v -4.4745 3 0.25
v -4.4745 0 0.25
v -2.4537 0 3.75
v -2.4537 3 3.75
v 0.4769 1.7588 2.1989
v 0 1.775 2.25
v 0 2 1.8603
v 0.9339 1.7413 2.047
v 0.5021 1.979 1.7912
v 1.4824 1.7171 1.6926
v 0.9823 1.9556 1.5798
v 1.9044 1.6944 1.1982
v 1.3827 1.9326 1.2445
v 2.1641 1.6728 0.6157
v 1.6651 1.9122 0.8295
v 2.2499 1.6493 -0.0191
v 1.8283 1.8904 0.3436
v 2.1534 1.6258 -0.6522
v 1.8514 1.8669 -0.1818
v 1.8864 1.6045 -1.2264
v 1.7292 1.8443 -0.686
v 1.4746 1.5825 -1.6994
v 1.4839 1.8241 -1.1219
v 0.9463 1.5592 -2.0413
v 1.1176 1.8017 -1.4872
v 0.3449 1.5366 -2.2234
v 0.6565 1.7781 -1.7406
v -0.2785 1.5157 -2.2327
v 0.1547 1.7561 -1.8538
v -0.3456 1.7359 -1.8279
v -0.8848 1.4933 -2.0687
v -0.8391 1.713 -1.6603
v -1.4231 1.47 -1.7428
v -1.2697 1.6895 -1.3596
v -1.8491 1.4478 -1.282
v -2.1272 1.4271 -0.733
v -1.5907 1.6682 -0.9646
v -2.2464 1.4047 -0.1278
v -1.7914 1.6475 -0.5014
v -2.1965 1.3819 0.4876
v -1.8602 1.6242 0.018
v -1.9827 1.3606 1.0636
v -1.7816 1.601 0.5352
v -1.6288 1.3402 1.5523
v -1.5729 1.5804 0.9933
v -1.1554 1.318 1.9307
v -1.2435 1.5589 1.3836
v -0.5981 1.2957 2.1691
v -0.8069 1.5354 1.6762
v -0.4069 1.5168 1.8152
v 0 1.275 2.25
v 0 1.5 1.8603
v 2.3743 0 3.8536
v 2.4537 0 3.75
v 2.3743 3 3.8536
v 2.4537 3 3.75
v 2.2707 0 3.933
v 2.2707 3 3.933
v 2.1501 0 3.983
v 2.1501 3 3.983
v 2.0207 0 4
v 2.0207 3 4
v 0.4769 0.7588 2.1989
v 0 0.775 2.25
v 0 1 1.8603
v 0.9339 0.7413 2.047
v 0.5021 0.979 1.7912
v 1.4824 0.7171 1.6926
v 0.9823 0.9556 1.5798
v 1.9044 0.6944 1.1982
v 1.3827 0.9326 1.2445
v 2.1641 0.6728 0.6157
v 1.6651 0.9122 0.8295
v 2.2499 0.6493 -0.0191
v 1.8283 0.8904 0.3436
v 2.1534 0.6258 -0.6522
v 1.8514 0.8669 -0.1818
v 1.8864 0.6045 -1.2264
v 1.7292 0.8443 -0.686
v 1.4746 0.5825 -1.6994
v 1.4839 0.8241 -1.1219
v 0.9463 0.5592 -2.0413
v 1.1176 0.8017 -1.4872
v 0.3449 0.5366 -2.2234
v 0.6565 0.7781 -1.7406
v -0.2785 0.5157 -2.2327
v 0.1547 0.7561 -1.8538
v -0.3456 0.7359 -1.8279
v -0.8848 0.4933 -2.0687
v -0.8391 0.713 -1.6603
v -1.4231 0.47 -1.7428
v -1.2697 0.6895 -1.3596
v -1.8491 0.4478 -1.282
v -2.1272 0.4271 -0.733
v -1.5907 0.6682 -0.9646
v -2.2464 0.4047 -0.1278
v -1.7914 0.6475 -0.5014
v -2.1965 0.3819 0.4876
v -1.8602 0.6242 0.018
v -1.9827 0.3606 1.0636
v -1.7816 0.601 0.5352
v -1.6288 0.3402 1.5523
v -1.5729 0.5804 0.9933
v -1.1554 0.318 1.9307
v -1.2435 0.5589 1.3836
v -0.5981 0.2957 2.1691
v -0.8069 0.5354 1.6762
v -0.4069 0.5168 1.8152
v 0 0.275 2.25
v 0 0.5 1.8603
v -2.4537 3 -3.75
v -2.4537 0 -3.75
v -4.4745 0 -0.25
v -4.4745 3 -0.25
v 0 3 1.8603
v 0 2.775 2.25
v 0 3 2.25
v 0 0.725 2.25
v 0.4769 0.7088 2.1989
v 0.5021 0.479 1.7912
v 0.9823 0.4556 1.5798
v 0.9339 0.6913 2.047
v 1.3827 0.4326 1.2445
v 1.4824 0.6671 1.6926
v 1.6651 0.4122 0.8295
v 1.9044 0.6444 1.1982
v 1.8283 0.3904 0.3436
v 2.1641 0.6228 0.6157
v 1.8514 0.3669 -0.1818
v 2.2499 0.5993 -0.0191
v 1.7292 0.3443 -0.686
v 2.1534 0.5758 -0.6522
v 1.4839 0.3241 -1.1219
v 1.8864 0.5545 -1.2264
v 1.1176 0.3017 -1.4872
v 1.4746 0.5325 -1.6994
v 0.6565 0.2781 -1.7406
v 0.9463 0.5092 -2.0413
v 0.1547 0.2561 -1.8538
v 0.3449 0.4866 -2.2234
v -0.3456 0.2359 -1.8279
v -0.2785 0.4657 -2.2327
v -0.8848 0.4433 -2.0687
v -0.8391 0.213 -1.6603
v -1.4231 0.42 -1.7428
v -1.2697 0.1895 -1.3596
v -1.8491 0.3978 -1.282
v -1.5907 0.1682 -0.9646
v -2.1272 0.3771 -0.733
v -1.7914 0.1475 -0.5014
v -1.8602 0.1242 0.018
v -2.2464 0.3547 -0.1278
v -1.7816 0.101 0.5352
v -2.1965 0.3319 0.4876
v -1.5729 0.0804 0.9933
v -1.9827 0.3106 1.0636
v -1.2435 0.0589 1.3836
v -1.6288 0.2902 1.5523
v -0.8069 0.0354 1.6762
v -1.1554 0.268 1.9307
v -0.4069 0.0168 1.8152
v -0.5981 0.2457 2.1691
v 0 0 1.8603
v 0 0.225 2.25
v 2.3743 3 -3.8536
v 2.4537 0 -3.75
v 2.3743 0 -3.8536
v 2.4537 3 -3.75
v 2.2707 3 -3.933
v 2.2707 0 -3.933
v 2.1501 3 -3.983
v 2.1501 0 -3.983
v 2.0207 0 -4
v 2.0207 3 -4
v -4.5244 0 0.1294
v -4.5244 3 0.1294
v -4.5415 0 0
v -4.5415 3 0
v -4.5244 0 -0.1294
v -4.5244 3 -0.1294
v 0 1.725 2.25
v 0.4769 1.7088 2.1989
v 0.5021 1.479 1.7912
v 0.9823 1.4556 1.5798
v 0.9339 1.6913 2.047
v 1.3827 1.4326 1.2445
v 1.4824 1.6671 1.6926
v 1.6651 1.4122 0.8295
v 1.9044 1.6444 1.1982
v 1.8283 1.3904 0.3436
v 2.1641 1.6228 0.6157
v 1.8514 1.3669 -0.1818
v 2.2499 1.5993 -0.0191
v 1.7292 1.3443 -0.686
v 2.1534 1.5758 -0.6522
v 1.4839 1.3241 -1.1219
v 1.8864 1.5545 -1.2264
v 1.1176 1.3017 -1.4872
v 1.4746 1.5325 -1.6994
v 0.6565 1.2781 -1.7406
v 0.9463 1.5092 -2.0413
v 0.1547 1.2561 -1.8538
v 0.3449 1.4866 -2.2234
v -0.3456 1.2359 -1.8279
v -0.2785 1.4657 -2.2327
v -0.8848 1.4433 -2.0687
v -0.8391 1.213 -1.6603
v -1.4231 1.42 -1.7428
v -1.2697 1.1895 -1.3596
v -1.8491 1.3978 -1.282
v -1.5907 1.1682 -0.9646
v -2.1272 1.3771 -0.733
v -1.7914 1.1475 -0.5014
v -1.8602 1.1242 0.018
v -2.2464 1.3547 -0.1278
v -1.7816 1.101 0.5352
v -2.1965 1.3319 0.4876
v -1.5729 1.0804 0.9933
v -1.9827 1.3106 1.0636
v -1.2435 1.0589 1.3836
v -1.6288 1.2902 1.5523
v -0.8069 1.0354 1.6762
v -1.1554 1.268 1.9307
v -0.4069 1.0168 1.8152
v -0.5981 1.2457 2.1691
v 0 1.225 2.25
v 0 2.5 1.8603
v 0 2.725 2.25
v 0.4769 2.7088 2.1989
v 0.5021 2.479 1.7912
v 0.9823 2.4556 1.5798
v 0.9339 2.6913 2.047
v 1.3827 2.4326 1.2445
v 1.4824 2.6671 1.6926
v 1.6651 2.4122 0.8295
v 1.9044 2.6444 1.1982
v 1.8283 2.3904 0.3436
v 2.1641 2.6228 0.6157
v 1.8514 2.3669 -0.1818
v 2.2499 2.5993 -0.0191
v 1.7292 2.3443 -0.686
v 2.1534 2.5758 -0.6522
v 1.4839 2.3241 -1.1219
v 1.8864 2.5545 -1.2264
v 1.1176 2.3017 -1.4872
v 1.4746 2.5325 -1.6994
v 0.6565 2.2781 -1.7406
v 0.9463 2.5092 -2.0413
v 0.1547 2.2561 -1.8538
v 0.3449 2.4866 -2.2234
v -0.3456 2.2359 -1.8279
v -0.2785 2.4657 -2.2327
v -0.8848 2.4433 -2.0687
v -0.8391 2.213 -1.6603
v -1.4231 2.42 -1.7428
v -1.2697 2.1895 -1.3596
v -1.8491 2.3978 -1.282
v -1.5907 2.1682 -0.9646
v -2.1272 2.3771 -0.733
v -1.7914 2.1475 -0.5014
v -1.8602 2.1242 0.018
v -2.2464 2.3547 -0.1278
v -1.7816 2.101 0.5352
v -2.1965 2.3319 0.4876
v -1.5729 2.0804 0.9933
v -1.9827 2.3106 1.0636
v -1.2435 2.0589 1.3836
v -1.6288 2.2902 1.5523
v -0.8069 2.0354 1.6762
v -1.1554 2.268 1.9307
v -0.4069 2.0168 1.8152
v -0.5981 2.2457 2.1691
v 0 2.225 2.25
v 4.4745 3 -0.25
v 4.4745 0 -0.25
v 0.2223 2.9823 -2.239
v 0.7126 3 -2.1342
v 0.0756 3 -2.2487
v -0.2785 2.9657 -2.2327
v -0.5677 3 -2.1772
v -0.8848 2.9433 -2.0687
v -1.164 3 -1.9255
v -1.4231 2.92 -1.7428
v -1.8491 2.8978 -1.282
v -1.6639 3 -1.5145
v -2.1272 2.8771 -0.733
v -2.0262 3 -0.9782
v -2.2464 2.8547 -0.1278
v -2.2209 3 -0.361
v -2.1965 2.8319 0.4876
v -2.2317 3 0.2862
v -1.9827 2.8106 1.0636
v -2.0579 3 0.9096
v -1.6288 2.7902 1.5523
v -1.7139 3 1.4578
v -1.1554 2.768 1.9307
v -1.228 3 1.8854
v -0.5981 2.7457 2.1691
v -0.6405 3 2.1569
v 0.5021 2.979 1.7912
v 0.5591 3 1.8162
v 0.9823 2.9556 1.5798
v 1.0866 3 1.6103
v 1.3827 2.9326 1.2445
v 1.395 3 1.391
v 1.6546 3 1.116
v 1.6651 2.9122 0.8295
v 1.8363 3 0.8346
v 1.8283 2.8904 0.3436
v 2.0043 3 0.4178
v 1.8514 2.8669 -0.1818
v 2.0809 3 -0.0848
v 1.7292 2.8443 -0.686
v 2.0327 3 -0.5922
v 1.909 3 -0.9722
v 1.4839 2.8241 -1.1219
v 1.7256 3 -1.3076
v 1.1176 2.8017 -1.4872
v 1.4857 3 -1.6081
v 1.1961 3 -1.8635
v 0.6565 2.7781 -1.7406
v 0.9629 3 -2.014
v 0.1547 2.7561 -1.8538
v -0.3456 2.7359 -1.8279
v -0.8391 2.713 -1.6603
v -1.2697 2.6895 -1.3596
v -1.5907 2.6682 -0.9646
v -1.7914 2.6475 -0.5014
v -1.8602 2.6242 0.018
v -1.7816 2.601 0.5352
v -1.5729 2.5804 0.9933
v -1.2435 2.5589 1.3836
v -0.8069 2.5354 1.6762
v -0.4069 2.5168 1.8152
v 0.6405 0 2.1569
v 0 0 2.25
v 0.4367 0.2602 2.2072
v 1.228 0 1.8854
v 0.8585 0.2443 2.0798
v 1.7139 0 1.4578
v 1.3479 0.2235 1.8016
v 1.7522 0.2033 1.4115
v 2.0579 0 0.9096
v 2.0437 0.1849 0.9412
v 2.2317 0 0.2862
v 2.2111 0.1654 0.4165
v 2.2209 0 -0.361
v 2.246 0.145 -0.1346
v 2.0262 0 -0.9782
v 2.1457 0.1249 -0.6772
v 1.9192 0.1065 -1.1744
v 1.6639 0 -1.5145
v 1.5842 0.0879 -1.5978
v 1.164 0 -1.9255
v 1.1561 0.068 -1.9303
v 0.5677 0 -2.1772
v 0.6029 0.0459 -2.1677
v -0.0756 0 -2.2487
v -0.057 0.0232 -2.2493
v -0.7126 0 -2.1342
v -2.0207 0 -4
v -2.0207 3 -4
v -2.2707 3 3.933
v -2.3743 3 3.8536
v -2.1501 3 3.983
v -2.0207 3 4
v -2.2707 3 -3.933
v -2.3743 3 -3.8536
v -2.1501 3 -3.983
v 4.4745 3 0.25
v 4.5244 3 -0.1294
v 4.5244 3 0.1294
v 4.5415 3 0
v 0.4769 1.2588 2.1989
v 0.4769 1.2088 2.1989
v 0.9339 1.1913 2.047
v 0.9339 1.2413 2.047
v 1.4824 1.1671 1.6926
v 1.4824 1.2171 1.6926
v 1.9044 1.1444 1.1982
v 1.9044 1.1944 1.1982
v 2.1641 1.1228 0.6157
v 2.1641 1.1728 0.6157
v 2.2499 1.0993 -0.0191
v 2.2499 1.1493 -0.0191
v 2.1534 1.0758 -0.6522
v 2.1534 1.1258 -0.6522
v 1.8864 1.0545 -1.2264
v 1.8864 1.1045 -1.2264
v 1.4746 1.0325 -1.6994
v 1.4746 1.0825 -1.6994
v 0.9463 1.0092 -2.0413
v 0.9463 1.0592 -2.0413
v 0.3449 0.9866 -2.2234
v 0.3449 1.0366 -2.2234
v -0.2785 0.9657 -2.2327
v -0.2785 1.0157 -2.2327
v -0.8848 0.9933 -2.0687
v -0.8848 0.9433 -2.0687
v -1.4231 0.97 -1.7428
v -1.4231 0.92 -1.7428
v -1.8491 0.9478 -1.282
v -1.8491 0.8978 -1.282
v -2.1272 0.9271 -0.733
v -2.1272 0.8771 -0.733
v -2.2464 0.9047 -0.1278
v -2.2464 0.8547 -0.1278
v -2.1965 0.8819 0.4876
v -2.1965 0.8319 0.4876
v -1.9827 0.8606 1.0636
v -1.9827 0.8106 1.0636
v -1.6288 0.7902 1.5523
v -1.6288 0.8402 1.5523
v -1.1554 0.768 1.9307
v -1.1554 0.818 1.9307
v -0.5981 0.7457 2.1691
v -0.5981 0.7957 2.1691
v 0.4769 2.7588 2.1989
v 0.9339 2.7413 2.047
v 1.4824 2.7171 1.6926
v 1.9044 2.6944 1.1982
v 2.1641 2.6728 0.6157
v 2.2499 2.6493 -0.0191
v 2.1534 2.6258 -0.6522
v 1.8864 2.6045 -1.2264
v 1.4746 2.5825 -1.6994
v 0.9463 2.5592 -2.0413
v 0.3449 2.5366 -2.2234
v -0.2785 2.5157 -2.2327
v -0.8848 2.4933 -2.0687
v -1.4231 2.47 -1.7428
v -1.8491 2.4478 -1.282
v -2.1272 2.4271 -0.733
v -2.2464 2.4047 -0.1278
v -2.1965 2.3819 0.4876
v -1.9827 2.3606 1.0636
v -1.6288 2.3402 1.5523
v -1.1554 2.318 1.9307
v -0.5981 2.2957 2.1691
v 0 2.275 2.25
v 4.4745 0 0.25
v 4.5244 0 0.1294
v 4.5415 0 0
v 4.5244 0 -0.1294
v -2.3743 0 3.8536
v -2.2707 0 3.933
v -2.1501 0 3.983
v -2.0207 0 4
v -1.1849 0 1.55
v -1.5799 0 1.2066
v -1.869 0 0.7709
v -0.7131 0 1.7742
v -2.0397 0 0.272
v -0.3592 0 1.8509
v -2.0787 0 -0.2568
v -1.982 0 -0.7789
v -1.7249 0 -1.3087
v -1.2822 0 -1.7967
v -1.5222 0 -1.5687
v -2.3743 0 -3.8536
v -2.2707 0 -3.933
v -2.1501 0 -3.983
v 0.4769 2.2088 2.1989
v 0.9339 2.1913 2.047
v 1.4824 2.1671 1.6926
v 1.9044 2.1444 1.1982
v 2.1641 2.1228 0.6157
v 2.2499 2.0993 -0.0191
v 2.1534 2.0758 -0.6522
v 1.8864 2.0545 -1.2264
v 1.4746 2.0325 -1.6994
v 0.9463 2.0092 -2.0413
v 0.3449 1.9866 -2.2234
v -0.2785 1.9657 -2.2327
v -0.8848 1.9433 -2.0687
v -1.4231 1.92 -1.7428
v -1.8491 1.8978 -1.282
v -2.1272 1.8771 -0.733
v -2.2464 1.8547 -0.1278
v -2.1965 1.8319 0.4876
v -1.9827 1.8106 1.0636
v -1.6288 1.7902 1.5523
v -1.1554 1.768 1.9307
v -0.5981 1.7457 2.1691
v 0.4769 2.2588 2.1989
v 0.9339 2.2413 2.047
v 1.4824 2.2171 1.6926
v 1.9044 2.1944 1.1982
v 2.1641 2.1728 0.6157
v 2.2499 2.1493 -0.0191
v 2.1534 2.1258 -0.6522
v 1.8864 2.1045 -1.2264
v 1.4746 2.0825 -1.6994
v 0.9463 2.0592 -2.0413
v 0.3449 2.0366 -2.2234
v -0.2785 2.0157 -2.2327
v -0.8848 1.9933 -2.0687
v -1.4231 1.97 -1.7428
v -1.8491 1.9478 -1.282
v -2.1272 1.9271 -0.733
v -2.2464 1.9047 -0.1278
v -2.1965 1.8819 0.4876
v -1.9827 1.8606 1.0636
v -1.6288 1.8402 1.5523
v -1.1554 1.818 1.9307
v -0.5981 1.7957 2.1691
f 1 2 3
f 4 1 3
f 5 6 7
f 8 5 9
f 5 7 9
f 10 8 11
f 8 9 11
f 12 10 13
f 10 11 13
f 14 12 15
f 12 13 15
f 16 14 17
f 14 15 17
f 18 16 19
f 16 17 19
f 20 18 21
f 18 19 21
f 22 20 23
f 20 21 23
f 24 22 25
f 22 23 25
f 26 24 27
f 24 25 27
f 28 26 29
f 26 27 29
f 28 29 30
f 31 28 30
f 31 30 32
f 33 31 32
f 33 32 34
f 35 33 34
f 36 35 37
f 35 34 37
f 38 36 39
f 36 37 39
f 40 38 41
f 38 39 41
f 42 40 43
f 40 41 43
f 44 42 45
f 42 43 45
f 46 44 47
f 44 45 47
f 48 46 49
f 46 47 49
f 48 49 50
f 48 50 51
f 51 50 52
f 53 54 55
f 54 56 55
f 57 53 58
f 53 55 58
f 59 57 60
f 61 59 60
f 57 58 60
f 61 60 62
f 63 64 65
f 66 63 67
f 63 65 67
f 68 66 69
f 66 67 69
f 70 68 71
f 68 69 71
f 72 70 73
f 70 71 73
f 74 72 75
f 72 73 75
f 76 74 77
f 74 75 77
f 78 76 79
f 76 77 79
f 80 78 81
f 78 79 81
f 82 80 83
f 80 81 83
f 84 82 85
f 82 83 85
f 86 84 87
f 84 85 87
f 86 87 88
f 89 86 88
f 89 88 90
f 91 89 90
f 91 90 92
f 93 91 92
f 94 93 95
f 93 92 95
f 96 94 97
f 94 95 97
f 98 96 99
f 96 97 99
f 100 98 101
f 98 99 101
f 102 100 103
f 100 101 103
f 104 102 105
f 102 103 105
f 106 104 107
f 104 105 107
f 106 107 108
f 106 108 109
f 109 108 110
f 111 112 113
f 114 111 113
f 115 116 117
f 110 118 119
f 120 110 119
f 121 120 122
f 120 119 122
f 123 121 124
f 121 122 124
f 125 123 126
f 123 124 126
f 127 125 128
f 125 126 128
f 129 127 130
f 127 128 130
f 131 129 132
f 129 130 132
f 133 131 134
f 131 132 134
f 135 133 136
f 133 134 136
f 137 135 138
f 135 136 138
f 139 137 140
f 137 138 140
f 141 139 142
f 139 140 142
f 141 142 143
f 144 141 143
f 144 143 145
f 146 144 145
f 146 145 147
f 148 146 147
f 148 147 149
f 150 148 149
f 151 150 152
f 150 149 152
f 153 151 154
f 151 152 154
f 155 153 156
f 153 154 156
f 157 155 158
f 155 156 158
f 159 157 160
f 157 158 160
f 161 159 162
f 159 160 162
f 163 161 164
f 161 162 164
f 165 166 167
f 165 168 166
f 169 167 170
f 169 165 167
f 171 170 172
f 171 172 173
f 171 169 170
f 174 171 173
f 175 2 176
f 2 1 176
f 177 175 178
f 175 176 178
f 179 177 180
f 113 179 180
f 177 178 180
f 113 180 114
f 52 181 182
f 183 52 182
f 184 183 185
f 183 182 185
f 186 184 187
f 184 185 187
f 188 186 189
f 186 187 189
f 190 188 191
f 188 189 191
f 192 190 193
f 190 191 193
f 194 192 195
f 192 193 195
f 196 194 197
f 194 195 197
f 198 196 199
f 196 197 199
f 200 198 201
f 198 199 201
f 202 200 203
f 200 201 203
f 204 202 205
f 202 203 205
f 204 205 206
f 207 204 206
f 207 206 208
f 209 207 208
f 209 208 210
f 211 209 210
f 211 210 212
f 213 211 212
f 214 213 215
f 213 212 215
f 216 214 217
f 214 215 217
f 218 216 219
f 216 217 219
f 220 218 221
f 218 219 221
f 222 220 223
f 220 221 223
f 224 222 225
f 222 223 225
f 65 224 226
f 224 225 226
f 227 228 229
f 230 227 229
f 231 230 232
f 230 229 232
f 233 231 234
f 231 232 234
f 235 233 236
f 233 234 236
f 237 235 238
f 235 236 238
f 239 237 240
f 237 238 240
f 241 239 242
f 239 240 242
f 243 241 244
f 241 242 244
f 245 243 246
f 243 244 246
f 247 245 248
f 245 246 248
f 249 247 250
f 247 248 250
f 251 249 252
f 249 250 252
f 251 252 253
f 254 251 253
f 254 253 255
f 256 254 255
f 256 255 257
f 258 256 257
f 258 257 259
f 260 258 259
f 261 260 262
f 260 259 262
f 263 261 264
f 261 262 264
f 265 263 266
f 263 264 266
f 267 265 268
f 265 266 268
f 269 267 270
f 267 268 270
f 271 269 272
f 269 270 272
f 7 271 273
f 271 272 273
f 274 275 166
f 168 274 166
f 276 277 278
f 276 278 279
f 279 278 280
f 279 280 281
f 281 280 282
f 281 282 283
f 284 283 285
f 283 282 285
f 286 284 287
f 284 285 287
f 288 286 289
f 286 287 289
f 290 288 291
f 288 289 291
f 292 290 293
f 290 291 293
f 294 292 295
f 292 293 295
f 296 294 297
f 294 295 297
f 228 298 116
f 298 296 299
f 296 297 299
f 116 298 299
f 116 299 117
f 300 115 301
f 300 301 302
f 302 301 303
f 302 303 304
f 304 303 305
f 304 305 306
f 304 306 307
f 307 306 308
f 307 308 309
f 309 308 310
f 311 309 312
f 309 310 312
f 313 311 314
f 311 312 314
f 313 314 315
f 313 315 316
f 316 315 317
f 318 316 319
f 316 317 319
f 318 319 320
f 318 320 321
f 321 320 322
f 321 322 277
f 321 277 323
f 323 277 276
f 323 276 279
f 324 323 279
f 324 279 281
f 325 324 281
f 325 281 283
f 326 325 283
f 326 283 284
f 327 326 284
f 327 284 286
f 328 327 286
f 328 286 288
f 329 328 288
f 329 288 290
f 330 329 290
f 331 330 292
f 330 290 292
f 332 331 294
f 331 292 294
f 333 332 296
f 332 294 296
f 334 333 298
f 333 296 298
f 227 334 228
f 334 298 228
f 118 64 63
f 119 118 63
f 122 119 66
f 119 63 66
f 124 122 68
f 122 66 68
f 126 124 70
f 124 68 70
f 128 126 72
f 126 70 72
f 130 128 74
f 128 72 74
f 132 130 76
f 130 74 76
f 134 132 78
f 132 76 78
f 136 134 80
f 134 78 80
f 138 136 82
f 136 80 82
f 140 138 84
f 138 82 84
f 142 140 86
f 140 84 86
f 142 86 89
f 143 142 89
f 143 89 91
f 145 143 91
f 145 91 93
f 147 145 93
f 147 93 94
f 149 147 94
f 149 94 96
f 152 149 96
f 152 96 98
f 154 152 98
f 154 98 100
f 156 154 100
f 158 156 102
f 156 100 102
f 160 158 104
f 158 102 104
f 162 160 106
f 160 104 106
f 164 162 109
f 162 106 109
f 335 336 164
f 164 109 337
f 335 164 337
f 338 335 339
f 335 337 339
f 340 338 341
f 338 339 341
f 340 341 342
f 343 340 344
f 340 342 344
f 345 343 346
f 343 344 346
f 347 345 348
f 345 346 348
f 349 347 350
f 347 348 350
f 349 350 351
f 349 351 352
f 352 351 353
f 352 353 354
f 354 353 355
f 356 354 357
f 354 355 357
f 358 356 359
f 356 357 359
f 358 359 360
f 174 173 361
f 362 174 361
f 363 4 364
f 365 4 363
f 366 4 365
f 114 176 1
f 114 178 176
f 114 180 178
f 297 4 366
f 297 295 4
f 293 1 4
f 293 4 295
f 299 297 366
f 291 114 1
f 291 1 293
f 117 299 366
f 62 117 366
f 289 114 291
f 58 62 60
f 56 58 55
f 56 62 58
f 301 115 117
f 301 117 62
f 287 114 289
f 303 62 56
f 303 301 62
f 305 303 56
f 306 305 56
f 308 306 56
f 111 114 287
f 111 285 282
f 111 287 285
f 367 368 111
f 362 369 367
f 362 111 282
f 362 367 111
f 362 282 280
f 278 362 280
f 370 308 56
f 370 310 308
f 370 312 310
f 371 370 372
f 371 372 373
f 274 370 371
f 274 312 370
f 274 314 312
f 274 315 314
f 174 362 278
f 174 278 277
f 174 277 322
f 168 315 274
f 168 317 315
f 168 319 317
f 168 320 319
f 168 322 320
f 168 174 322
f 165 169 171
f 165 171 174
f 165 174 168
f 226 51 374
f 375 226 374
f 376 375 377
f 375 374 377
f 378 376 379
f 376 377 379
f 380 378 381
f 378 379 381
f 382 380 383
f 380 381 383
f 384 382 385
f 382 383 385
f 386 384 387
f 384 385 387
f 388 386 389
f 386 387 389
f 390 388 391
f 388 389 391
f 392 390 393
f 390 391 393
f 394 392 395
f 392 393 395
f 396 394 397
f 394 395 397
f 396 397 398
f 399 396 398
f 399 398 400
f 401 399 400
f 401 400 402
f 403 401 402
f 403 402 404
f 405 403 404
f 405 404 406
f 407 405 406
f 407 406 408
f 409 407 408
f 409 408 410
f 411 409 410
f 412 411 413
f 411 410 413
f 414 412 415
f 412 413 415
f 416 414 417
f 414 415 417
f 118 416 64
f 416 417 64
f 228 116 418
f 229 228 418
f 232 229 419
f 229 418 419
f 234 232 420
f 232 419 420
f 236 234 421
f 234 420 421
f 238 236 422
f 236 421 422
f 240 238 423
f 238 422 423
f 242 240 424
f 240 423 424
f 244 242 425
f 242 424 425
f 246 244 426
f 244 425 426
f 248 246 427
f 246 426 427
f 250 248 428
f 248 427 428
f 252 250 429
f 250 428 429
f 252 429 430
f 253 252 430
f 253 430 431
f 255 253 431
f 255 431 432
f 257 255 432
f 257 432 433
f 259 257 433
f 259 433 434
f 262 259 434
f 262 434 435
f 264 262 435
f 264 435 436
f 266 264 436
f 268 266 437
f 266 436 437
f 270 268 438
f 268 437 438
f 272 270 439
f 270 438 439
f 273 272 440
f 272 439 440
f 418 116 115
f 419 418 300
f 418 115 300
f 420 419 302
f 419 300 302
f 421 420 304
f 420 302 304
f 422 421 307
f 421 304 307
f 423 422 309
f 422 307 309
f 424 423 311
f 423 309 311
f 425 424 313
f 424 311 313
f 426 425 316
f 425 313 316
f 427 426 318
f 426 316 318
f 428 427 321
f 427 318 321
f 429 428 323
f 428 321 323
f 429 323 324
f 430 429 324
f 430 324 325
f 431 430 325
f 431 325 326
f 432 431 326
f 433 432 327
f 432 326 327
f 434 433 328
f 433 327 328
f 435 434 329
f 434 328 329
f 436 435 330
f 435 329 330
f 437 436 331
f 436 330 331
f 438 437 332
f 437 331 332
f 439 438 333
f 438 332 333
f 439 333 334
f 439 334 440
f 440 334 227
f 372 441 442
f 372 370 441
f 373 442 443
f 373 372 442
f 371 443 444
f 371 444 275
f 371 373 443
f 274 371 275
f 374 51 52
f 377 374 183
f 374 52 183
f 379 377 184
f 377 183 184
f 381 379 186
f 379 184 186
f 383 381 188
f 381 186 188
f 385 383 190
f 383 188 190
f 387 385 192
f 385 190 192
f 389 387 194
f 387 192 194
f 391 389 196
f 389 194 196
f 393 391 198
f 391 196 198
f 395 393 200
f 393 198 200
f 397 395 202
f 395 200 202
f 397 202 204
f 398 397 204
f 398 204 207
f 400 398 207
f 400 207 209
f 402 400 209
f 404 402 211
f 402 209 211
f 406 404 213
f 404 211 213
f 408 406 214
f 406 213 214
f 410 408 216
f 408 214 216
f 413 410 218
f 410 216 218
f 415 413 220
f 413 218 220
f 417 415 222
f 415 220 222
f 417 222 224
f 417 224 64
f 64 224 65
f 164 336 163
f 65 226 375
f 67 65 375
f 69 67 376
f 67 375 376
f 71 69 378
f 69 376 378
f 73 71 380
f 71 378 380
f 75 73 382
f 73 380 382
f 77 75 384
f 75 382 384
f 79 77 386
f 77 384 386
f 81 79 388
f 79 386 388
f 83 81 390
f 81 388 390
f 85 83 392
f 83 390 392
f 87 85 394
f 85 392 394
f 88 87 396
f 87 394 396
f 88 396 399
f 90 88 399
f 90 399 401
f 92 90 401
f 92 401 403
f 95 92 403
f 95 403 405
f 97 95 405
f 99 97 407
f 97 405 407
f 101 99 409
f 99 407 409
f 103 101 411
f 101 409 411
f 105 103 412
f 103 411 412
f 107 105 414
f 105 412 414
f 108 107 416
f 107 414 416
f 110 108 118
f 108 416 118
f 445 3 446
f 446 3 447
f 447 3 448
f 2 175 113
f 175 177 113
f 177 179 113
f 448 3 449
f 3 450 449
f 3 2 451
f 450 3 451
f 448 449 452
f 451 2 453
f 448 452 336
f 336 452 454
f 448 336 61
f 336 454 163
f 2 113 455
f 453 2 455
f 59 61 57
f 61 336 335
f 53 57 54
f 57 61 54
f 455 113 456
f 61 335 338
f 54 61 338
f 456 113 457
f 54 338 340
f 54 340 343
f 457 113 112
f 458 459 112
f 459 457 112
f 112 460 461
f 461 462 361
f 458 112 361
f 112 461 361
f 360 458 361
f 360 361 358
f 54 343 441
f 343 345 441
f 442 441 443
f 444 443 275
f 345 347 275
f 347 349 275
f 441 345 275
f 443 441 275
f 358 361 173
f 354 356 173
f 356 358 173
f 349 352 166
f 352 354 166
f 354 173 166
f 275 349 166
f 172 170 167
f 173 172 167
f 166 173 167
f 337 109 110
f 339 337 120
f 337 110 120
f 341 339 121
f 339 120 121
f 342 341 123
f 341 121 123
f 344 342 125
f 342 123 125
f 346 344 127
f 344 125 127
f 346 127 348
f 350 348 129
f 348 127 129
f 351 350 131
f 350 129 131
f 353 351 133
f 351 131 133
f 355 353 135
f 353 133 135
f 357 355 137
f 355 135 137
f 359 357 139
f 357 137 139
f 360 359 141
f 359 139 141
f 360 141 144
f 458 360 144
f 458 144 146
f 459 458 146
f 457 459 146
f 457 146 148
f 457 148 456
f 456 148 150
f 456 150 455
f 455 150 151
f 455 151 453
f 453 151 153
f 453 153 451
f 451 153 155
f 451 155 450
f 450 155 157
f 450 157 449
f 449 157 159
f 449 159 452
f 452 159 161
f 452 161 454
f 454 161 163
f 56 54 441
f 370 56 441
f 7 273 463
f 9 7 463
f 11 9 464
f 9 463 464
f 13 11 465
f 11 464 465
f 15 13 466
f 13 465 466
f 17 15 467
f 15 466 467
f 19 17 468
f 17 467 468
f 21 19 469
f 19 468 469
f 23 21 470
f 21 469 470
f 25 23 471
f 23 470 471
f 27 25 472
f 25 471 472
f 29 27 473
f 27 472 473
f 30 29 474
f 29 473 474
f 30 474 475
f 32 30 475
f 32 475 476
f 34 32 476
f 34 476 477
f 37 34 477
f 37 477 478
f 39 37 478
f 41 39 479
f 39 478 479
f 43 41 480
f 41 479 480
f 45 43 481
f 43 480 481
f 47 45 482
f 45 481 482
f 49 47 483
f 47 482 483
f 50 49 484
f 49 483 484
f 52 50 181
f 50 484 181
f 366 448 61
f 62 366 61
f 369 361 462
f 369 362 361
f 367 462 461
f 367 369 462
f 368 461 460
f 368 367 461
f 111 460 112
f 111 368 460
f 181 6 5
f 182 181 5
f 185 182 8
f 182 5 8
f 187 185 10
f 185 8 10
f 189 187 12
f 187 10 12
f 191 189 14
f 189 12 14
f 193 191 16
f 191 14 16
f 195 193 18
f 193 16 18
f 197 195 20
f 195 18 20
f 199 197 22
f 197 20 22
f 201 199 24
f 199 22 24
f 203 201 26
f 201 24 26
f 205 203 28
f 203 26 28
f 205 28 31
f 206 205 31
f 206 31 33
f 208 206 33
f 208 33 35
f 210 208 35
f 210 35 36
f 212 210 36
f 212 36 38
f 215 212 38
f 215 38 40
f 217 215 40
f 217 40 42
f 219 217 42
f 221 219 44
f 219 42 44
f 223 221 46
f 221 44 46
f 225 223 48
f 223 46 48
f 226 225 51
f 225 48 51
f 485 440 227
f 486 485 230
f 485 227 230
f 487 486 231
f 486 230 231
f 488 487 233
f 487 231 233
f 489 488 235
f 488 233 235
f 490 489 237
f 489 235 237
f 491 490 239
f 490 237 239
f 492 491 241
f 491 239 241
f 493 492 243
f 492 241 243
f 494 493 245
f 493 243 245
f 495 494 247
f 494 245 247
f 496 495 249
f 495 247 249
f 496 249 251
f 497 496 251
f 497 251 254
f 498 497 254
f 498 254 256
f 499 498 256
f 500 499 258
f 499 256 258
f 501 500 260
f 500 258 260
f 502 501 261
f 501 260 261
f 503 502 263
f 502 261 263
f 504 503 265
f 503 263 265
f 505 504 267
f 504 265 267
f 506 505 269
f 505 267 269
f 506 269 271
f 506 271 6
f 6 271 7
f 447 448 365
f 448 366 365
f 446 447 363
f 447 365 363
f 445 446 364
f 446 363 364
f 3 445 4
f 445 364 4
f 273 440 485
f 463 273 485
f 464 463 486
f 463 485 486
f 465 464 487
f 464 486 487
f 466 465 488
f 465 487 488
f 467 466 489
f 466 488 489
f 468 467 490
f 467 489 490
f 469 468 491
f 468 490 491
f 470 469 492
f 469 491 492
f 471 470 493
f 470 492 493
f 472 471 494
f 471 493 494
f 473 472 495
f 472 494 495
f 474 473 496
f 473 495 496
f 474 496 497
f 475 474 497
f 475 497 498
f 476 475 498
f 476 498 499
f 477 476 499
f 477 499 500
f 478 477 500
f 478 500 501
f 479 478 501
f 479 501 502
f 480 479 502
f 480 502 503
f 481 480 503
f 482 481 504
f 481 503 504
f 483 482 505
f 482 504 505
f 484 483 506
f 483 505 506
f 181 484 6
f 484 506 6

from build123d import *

# Parameters (mm, degrees)
BOSS_EXTRUDE1_DEPTH = 3
SKETCH2_R           = 2.25
CUT_EXTRUDE1_DEPTH  = 7.806859286
FILLET1_R           = 0.5
SWEEP3_PITCH        = 0.5


with BuildPart() as part:
    # Sketch1 → Boss-Extrude1 (new body)
    with BuildSketch(Plane(origin=(0, 0, 0), x_dir=(1, 0, 0), z_dir=(0, 1, 0))):
        Polygon((2.309401077, -4), (4.618802154, 0), (2.309401077, 4), (-2.309401077, 4), (-4.618802154, 0), (-2.309401077, -4), align=None)
    extrude(amount=BOSS_EXTRUDE1_DEPTH)

    # Sketch2 → Cut-Extrude1 (cut, through all)
    with BuildSketch(Plane(origin=(0, 3, 0), x_dir=(1, 0, 0), z_dir=(0, 1, 0))):
        with Locations(Location((0, 0, 0), (0, 0, 270))):
            Circle(SKETCH2_R)
    extrude(amount=-CUT_EXTRUDE1_DEPTH, mode=Mode.SUBTRACT)

    # Fillet1
    fillet1_edges = [part.edges().sort_by_distance(p)[0] for p in [
        (-2.309401077, 1.5, 4),
        (-4.618802154, 1.5, 0),
        (-2.309401077, 1.5, -4),
        (2.309401077, 1.5, -4),
        (4.618802154, 1.5, 0),
        (2.309401077, 1.5, 4),
    ]]
    fillet(fillet1_edges, radius=FILLET1_R)

    # Sweep3: the profile of Sketch5 profile screwed along a left-hand helix of 6 turns, 6 arcs to a turn; built about Z, then put on its axis
    sweep3_z = Axis((0, 0, 0), (0, 0, 1))
    sweep3_corners = [(2.2503, 0, 0.225173205), (1.860288568, 0, 0), (2.2503, 0, -0.225173205)]
    with BuildLine(mode=Mode.PRIVATE) as sweep3_profile:
        Line(sweep3_corners[0], sweep3_corners[1])
        Line(sweep3_corners[1], sweep3_corners[2])
        Line(sweep3_corners[2], sweep3_corners[0])
    sweep3_cap = Face(sweep3_profile.wire())
    sweep3_turn_angles = [0, -30, -60, -90, -120, -150, -180, -210, -240, -270, -300, -330, -360]
    sweep3_turn_weights = [1, 0.8660254037844387, 1, 0.8660254037844387, 1, 0.8660254037844387, 1, 0.8660254037844387, 1, 0.8660254037844387, 1, 0.8660254037844387, 1]
    sweep3_turn_rails = [Edge.make_bspline([Vector(p[0], p[1], 0).rotate(sweep3_z, sweep3_turn_angles[k]) / sweep3_turn_weights[k] + Vector(0, 0, p[2] + -SWEEP3_PITCH * sweep3_turn_angles[k] / 360) for k in range(13)], [0, 0, 0, 1, 1, 2, 2, 3, 3, 4, 4, 5, 5, 6, 6, 6], 2, sweep3_turn_weights) for p in sweep3_corners]
    sweep3_turn_sides = [Face.make_surface_from_curves(sweep3_turn_rails[p[0]], sweep3_turn_rails[p[1]]) for p in [(0, 1), (1, 2), (2, 0)]]
    sweep3 = Plane(origin=(0, 3, 0), x_dir=(0, 0, 1), z_dir=(0, -1, 0)) * Solid(Shell([*[p.moved(Location((0, 0, SWEEP3_PITCH * i))) for i in range(6) for p in sweep3_turn_sides], sweep3_cap, sweep3_cap.rotate(sweep3_z, -2160).moved(Location((0, 0, -SWEEP3_PITCH * -2160 / 360)))]))
    add(sweep3)

    # SurfaceCut1
    split(bisect_by=Plane(origin=(0, 3, 0), x_dir=(1, 0, 0), z_dir=(0, 1, 0)), keep=Keep.BOTTOM)

    # SurfaceCut2
    split(bisect_by=Plane(origin=(0, 0, 0), x_dir=(-1, 0, 0), z_dir=(0, -1, 0)), keep=Keep.BOTTOM)


solid = part.part
